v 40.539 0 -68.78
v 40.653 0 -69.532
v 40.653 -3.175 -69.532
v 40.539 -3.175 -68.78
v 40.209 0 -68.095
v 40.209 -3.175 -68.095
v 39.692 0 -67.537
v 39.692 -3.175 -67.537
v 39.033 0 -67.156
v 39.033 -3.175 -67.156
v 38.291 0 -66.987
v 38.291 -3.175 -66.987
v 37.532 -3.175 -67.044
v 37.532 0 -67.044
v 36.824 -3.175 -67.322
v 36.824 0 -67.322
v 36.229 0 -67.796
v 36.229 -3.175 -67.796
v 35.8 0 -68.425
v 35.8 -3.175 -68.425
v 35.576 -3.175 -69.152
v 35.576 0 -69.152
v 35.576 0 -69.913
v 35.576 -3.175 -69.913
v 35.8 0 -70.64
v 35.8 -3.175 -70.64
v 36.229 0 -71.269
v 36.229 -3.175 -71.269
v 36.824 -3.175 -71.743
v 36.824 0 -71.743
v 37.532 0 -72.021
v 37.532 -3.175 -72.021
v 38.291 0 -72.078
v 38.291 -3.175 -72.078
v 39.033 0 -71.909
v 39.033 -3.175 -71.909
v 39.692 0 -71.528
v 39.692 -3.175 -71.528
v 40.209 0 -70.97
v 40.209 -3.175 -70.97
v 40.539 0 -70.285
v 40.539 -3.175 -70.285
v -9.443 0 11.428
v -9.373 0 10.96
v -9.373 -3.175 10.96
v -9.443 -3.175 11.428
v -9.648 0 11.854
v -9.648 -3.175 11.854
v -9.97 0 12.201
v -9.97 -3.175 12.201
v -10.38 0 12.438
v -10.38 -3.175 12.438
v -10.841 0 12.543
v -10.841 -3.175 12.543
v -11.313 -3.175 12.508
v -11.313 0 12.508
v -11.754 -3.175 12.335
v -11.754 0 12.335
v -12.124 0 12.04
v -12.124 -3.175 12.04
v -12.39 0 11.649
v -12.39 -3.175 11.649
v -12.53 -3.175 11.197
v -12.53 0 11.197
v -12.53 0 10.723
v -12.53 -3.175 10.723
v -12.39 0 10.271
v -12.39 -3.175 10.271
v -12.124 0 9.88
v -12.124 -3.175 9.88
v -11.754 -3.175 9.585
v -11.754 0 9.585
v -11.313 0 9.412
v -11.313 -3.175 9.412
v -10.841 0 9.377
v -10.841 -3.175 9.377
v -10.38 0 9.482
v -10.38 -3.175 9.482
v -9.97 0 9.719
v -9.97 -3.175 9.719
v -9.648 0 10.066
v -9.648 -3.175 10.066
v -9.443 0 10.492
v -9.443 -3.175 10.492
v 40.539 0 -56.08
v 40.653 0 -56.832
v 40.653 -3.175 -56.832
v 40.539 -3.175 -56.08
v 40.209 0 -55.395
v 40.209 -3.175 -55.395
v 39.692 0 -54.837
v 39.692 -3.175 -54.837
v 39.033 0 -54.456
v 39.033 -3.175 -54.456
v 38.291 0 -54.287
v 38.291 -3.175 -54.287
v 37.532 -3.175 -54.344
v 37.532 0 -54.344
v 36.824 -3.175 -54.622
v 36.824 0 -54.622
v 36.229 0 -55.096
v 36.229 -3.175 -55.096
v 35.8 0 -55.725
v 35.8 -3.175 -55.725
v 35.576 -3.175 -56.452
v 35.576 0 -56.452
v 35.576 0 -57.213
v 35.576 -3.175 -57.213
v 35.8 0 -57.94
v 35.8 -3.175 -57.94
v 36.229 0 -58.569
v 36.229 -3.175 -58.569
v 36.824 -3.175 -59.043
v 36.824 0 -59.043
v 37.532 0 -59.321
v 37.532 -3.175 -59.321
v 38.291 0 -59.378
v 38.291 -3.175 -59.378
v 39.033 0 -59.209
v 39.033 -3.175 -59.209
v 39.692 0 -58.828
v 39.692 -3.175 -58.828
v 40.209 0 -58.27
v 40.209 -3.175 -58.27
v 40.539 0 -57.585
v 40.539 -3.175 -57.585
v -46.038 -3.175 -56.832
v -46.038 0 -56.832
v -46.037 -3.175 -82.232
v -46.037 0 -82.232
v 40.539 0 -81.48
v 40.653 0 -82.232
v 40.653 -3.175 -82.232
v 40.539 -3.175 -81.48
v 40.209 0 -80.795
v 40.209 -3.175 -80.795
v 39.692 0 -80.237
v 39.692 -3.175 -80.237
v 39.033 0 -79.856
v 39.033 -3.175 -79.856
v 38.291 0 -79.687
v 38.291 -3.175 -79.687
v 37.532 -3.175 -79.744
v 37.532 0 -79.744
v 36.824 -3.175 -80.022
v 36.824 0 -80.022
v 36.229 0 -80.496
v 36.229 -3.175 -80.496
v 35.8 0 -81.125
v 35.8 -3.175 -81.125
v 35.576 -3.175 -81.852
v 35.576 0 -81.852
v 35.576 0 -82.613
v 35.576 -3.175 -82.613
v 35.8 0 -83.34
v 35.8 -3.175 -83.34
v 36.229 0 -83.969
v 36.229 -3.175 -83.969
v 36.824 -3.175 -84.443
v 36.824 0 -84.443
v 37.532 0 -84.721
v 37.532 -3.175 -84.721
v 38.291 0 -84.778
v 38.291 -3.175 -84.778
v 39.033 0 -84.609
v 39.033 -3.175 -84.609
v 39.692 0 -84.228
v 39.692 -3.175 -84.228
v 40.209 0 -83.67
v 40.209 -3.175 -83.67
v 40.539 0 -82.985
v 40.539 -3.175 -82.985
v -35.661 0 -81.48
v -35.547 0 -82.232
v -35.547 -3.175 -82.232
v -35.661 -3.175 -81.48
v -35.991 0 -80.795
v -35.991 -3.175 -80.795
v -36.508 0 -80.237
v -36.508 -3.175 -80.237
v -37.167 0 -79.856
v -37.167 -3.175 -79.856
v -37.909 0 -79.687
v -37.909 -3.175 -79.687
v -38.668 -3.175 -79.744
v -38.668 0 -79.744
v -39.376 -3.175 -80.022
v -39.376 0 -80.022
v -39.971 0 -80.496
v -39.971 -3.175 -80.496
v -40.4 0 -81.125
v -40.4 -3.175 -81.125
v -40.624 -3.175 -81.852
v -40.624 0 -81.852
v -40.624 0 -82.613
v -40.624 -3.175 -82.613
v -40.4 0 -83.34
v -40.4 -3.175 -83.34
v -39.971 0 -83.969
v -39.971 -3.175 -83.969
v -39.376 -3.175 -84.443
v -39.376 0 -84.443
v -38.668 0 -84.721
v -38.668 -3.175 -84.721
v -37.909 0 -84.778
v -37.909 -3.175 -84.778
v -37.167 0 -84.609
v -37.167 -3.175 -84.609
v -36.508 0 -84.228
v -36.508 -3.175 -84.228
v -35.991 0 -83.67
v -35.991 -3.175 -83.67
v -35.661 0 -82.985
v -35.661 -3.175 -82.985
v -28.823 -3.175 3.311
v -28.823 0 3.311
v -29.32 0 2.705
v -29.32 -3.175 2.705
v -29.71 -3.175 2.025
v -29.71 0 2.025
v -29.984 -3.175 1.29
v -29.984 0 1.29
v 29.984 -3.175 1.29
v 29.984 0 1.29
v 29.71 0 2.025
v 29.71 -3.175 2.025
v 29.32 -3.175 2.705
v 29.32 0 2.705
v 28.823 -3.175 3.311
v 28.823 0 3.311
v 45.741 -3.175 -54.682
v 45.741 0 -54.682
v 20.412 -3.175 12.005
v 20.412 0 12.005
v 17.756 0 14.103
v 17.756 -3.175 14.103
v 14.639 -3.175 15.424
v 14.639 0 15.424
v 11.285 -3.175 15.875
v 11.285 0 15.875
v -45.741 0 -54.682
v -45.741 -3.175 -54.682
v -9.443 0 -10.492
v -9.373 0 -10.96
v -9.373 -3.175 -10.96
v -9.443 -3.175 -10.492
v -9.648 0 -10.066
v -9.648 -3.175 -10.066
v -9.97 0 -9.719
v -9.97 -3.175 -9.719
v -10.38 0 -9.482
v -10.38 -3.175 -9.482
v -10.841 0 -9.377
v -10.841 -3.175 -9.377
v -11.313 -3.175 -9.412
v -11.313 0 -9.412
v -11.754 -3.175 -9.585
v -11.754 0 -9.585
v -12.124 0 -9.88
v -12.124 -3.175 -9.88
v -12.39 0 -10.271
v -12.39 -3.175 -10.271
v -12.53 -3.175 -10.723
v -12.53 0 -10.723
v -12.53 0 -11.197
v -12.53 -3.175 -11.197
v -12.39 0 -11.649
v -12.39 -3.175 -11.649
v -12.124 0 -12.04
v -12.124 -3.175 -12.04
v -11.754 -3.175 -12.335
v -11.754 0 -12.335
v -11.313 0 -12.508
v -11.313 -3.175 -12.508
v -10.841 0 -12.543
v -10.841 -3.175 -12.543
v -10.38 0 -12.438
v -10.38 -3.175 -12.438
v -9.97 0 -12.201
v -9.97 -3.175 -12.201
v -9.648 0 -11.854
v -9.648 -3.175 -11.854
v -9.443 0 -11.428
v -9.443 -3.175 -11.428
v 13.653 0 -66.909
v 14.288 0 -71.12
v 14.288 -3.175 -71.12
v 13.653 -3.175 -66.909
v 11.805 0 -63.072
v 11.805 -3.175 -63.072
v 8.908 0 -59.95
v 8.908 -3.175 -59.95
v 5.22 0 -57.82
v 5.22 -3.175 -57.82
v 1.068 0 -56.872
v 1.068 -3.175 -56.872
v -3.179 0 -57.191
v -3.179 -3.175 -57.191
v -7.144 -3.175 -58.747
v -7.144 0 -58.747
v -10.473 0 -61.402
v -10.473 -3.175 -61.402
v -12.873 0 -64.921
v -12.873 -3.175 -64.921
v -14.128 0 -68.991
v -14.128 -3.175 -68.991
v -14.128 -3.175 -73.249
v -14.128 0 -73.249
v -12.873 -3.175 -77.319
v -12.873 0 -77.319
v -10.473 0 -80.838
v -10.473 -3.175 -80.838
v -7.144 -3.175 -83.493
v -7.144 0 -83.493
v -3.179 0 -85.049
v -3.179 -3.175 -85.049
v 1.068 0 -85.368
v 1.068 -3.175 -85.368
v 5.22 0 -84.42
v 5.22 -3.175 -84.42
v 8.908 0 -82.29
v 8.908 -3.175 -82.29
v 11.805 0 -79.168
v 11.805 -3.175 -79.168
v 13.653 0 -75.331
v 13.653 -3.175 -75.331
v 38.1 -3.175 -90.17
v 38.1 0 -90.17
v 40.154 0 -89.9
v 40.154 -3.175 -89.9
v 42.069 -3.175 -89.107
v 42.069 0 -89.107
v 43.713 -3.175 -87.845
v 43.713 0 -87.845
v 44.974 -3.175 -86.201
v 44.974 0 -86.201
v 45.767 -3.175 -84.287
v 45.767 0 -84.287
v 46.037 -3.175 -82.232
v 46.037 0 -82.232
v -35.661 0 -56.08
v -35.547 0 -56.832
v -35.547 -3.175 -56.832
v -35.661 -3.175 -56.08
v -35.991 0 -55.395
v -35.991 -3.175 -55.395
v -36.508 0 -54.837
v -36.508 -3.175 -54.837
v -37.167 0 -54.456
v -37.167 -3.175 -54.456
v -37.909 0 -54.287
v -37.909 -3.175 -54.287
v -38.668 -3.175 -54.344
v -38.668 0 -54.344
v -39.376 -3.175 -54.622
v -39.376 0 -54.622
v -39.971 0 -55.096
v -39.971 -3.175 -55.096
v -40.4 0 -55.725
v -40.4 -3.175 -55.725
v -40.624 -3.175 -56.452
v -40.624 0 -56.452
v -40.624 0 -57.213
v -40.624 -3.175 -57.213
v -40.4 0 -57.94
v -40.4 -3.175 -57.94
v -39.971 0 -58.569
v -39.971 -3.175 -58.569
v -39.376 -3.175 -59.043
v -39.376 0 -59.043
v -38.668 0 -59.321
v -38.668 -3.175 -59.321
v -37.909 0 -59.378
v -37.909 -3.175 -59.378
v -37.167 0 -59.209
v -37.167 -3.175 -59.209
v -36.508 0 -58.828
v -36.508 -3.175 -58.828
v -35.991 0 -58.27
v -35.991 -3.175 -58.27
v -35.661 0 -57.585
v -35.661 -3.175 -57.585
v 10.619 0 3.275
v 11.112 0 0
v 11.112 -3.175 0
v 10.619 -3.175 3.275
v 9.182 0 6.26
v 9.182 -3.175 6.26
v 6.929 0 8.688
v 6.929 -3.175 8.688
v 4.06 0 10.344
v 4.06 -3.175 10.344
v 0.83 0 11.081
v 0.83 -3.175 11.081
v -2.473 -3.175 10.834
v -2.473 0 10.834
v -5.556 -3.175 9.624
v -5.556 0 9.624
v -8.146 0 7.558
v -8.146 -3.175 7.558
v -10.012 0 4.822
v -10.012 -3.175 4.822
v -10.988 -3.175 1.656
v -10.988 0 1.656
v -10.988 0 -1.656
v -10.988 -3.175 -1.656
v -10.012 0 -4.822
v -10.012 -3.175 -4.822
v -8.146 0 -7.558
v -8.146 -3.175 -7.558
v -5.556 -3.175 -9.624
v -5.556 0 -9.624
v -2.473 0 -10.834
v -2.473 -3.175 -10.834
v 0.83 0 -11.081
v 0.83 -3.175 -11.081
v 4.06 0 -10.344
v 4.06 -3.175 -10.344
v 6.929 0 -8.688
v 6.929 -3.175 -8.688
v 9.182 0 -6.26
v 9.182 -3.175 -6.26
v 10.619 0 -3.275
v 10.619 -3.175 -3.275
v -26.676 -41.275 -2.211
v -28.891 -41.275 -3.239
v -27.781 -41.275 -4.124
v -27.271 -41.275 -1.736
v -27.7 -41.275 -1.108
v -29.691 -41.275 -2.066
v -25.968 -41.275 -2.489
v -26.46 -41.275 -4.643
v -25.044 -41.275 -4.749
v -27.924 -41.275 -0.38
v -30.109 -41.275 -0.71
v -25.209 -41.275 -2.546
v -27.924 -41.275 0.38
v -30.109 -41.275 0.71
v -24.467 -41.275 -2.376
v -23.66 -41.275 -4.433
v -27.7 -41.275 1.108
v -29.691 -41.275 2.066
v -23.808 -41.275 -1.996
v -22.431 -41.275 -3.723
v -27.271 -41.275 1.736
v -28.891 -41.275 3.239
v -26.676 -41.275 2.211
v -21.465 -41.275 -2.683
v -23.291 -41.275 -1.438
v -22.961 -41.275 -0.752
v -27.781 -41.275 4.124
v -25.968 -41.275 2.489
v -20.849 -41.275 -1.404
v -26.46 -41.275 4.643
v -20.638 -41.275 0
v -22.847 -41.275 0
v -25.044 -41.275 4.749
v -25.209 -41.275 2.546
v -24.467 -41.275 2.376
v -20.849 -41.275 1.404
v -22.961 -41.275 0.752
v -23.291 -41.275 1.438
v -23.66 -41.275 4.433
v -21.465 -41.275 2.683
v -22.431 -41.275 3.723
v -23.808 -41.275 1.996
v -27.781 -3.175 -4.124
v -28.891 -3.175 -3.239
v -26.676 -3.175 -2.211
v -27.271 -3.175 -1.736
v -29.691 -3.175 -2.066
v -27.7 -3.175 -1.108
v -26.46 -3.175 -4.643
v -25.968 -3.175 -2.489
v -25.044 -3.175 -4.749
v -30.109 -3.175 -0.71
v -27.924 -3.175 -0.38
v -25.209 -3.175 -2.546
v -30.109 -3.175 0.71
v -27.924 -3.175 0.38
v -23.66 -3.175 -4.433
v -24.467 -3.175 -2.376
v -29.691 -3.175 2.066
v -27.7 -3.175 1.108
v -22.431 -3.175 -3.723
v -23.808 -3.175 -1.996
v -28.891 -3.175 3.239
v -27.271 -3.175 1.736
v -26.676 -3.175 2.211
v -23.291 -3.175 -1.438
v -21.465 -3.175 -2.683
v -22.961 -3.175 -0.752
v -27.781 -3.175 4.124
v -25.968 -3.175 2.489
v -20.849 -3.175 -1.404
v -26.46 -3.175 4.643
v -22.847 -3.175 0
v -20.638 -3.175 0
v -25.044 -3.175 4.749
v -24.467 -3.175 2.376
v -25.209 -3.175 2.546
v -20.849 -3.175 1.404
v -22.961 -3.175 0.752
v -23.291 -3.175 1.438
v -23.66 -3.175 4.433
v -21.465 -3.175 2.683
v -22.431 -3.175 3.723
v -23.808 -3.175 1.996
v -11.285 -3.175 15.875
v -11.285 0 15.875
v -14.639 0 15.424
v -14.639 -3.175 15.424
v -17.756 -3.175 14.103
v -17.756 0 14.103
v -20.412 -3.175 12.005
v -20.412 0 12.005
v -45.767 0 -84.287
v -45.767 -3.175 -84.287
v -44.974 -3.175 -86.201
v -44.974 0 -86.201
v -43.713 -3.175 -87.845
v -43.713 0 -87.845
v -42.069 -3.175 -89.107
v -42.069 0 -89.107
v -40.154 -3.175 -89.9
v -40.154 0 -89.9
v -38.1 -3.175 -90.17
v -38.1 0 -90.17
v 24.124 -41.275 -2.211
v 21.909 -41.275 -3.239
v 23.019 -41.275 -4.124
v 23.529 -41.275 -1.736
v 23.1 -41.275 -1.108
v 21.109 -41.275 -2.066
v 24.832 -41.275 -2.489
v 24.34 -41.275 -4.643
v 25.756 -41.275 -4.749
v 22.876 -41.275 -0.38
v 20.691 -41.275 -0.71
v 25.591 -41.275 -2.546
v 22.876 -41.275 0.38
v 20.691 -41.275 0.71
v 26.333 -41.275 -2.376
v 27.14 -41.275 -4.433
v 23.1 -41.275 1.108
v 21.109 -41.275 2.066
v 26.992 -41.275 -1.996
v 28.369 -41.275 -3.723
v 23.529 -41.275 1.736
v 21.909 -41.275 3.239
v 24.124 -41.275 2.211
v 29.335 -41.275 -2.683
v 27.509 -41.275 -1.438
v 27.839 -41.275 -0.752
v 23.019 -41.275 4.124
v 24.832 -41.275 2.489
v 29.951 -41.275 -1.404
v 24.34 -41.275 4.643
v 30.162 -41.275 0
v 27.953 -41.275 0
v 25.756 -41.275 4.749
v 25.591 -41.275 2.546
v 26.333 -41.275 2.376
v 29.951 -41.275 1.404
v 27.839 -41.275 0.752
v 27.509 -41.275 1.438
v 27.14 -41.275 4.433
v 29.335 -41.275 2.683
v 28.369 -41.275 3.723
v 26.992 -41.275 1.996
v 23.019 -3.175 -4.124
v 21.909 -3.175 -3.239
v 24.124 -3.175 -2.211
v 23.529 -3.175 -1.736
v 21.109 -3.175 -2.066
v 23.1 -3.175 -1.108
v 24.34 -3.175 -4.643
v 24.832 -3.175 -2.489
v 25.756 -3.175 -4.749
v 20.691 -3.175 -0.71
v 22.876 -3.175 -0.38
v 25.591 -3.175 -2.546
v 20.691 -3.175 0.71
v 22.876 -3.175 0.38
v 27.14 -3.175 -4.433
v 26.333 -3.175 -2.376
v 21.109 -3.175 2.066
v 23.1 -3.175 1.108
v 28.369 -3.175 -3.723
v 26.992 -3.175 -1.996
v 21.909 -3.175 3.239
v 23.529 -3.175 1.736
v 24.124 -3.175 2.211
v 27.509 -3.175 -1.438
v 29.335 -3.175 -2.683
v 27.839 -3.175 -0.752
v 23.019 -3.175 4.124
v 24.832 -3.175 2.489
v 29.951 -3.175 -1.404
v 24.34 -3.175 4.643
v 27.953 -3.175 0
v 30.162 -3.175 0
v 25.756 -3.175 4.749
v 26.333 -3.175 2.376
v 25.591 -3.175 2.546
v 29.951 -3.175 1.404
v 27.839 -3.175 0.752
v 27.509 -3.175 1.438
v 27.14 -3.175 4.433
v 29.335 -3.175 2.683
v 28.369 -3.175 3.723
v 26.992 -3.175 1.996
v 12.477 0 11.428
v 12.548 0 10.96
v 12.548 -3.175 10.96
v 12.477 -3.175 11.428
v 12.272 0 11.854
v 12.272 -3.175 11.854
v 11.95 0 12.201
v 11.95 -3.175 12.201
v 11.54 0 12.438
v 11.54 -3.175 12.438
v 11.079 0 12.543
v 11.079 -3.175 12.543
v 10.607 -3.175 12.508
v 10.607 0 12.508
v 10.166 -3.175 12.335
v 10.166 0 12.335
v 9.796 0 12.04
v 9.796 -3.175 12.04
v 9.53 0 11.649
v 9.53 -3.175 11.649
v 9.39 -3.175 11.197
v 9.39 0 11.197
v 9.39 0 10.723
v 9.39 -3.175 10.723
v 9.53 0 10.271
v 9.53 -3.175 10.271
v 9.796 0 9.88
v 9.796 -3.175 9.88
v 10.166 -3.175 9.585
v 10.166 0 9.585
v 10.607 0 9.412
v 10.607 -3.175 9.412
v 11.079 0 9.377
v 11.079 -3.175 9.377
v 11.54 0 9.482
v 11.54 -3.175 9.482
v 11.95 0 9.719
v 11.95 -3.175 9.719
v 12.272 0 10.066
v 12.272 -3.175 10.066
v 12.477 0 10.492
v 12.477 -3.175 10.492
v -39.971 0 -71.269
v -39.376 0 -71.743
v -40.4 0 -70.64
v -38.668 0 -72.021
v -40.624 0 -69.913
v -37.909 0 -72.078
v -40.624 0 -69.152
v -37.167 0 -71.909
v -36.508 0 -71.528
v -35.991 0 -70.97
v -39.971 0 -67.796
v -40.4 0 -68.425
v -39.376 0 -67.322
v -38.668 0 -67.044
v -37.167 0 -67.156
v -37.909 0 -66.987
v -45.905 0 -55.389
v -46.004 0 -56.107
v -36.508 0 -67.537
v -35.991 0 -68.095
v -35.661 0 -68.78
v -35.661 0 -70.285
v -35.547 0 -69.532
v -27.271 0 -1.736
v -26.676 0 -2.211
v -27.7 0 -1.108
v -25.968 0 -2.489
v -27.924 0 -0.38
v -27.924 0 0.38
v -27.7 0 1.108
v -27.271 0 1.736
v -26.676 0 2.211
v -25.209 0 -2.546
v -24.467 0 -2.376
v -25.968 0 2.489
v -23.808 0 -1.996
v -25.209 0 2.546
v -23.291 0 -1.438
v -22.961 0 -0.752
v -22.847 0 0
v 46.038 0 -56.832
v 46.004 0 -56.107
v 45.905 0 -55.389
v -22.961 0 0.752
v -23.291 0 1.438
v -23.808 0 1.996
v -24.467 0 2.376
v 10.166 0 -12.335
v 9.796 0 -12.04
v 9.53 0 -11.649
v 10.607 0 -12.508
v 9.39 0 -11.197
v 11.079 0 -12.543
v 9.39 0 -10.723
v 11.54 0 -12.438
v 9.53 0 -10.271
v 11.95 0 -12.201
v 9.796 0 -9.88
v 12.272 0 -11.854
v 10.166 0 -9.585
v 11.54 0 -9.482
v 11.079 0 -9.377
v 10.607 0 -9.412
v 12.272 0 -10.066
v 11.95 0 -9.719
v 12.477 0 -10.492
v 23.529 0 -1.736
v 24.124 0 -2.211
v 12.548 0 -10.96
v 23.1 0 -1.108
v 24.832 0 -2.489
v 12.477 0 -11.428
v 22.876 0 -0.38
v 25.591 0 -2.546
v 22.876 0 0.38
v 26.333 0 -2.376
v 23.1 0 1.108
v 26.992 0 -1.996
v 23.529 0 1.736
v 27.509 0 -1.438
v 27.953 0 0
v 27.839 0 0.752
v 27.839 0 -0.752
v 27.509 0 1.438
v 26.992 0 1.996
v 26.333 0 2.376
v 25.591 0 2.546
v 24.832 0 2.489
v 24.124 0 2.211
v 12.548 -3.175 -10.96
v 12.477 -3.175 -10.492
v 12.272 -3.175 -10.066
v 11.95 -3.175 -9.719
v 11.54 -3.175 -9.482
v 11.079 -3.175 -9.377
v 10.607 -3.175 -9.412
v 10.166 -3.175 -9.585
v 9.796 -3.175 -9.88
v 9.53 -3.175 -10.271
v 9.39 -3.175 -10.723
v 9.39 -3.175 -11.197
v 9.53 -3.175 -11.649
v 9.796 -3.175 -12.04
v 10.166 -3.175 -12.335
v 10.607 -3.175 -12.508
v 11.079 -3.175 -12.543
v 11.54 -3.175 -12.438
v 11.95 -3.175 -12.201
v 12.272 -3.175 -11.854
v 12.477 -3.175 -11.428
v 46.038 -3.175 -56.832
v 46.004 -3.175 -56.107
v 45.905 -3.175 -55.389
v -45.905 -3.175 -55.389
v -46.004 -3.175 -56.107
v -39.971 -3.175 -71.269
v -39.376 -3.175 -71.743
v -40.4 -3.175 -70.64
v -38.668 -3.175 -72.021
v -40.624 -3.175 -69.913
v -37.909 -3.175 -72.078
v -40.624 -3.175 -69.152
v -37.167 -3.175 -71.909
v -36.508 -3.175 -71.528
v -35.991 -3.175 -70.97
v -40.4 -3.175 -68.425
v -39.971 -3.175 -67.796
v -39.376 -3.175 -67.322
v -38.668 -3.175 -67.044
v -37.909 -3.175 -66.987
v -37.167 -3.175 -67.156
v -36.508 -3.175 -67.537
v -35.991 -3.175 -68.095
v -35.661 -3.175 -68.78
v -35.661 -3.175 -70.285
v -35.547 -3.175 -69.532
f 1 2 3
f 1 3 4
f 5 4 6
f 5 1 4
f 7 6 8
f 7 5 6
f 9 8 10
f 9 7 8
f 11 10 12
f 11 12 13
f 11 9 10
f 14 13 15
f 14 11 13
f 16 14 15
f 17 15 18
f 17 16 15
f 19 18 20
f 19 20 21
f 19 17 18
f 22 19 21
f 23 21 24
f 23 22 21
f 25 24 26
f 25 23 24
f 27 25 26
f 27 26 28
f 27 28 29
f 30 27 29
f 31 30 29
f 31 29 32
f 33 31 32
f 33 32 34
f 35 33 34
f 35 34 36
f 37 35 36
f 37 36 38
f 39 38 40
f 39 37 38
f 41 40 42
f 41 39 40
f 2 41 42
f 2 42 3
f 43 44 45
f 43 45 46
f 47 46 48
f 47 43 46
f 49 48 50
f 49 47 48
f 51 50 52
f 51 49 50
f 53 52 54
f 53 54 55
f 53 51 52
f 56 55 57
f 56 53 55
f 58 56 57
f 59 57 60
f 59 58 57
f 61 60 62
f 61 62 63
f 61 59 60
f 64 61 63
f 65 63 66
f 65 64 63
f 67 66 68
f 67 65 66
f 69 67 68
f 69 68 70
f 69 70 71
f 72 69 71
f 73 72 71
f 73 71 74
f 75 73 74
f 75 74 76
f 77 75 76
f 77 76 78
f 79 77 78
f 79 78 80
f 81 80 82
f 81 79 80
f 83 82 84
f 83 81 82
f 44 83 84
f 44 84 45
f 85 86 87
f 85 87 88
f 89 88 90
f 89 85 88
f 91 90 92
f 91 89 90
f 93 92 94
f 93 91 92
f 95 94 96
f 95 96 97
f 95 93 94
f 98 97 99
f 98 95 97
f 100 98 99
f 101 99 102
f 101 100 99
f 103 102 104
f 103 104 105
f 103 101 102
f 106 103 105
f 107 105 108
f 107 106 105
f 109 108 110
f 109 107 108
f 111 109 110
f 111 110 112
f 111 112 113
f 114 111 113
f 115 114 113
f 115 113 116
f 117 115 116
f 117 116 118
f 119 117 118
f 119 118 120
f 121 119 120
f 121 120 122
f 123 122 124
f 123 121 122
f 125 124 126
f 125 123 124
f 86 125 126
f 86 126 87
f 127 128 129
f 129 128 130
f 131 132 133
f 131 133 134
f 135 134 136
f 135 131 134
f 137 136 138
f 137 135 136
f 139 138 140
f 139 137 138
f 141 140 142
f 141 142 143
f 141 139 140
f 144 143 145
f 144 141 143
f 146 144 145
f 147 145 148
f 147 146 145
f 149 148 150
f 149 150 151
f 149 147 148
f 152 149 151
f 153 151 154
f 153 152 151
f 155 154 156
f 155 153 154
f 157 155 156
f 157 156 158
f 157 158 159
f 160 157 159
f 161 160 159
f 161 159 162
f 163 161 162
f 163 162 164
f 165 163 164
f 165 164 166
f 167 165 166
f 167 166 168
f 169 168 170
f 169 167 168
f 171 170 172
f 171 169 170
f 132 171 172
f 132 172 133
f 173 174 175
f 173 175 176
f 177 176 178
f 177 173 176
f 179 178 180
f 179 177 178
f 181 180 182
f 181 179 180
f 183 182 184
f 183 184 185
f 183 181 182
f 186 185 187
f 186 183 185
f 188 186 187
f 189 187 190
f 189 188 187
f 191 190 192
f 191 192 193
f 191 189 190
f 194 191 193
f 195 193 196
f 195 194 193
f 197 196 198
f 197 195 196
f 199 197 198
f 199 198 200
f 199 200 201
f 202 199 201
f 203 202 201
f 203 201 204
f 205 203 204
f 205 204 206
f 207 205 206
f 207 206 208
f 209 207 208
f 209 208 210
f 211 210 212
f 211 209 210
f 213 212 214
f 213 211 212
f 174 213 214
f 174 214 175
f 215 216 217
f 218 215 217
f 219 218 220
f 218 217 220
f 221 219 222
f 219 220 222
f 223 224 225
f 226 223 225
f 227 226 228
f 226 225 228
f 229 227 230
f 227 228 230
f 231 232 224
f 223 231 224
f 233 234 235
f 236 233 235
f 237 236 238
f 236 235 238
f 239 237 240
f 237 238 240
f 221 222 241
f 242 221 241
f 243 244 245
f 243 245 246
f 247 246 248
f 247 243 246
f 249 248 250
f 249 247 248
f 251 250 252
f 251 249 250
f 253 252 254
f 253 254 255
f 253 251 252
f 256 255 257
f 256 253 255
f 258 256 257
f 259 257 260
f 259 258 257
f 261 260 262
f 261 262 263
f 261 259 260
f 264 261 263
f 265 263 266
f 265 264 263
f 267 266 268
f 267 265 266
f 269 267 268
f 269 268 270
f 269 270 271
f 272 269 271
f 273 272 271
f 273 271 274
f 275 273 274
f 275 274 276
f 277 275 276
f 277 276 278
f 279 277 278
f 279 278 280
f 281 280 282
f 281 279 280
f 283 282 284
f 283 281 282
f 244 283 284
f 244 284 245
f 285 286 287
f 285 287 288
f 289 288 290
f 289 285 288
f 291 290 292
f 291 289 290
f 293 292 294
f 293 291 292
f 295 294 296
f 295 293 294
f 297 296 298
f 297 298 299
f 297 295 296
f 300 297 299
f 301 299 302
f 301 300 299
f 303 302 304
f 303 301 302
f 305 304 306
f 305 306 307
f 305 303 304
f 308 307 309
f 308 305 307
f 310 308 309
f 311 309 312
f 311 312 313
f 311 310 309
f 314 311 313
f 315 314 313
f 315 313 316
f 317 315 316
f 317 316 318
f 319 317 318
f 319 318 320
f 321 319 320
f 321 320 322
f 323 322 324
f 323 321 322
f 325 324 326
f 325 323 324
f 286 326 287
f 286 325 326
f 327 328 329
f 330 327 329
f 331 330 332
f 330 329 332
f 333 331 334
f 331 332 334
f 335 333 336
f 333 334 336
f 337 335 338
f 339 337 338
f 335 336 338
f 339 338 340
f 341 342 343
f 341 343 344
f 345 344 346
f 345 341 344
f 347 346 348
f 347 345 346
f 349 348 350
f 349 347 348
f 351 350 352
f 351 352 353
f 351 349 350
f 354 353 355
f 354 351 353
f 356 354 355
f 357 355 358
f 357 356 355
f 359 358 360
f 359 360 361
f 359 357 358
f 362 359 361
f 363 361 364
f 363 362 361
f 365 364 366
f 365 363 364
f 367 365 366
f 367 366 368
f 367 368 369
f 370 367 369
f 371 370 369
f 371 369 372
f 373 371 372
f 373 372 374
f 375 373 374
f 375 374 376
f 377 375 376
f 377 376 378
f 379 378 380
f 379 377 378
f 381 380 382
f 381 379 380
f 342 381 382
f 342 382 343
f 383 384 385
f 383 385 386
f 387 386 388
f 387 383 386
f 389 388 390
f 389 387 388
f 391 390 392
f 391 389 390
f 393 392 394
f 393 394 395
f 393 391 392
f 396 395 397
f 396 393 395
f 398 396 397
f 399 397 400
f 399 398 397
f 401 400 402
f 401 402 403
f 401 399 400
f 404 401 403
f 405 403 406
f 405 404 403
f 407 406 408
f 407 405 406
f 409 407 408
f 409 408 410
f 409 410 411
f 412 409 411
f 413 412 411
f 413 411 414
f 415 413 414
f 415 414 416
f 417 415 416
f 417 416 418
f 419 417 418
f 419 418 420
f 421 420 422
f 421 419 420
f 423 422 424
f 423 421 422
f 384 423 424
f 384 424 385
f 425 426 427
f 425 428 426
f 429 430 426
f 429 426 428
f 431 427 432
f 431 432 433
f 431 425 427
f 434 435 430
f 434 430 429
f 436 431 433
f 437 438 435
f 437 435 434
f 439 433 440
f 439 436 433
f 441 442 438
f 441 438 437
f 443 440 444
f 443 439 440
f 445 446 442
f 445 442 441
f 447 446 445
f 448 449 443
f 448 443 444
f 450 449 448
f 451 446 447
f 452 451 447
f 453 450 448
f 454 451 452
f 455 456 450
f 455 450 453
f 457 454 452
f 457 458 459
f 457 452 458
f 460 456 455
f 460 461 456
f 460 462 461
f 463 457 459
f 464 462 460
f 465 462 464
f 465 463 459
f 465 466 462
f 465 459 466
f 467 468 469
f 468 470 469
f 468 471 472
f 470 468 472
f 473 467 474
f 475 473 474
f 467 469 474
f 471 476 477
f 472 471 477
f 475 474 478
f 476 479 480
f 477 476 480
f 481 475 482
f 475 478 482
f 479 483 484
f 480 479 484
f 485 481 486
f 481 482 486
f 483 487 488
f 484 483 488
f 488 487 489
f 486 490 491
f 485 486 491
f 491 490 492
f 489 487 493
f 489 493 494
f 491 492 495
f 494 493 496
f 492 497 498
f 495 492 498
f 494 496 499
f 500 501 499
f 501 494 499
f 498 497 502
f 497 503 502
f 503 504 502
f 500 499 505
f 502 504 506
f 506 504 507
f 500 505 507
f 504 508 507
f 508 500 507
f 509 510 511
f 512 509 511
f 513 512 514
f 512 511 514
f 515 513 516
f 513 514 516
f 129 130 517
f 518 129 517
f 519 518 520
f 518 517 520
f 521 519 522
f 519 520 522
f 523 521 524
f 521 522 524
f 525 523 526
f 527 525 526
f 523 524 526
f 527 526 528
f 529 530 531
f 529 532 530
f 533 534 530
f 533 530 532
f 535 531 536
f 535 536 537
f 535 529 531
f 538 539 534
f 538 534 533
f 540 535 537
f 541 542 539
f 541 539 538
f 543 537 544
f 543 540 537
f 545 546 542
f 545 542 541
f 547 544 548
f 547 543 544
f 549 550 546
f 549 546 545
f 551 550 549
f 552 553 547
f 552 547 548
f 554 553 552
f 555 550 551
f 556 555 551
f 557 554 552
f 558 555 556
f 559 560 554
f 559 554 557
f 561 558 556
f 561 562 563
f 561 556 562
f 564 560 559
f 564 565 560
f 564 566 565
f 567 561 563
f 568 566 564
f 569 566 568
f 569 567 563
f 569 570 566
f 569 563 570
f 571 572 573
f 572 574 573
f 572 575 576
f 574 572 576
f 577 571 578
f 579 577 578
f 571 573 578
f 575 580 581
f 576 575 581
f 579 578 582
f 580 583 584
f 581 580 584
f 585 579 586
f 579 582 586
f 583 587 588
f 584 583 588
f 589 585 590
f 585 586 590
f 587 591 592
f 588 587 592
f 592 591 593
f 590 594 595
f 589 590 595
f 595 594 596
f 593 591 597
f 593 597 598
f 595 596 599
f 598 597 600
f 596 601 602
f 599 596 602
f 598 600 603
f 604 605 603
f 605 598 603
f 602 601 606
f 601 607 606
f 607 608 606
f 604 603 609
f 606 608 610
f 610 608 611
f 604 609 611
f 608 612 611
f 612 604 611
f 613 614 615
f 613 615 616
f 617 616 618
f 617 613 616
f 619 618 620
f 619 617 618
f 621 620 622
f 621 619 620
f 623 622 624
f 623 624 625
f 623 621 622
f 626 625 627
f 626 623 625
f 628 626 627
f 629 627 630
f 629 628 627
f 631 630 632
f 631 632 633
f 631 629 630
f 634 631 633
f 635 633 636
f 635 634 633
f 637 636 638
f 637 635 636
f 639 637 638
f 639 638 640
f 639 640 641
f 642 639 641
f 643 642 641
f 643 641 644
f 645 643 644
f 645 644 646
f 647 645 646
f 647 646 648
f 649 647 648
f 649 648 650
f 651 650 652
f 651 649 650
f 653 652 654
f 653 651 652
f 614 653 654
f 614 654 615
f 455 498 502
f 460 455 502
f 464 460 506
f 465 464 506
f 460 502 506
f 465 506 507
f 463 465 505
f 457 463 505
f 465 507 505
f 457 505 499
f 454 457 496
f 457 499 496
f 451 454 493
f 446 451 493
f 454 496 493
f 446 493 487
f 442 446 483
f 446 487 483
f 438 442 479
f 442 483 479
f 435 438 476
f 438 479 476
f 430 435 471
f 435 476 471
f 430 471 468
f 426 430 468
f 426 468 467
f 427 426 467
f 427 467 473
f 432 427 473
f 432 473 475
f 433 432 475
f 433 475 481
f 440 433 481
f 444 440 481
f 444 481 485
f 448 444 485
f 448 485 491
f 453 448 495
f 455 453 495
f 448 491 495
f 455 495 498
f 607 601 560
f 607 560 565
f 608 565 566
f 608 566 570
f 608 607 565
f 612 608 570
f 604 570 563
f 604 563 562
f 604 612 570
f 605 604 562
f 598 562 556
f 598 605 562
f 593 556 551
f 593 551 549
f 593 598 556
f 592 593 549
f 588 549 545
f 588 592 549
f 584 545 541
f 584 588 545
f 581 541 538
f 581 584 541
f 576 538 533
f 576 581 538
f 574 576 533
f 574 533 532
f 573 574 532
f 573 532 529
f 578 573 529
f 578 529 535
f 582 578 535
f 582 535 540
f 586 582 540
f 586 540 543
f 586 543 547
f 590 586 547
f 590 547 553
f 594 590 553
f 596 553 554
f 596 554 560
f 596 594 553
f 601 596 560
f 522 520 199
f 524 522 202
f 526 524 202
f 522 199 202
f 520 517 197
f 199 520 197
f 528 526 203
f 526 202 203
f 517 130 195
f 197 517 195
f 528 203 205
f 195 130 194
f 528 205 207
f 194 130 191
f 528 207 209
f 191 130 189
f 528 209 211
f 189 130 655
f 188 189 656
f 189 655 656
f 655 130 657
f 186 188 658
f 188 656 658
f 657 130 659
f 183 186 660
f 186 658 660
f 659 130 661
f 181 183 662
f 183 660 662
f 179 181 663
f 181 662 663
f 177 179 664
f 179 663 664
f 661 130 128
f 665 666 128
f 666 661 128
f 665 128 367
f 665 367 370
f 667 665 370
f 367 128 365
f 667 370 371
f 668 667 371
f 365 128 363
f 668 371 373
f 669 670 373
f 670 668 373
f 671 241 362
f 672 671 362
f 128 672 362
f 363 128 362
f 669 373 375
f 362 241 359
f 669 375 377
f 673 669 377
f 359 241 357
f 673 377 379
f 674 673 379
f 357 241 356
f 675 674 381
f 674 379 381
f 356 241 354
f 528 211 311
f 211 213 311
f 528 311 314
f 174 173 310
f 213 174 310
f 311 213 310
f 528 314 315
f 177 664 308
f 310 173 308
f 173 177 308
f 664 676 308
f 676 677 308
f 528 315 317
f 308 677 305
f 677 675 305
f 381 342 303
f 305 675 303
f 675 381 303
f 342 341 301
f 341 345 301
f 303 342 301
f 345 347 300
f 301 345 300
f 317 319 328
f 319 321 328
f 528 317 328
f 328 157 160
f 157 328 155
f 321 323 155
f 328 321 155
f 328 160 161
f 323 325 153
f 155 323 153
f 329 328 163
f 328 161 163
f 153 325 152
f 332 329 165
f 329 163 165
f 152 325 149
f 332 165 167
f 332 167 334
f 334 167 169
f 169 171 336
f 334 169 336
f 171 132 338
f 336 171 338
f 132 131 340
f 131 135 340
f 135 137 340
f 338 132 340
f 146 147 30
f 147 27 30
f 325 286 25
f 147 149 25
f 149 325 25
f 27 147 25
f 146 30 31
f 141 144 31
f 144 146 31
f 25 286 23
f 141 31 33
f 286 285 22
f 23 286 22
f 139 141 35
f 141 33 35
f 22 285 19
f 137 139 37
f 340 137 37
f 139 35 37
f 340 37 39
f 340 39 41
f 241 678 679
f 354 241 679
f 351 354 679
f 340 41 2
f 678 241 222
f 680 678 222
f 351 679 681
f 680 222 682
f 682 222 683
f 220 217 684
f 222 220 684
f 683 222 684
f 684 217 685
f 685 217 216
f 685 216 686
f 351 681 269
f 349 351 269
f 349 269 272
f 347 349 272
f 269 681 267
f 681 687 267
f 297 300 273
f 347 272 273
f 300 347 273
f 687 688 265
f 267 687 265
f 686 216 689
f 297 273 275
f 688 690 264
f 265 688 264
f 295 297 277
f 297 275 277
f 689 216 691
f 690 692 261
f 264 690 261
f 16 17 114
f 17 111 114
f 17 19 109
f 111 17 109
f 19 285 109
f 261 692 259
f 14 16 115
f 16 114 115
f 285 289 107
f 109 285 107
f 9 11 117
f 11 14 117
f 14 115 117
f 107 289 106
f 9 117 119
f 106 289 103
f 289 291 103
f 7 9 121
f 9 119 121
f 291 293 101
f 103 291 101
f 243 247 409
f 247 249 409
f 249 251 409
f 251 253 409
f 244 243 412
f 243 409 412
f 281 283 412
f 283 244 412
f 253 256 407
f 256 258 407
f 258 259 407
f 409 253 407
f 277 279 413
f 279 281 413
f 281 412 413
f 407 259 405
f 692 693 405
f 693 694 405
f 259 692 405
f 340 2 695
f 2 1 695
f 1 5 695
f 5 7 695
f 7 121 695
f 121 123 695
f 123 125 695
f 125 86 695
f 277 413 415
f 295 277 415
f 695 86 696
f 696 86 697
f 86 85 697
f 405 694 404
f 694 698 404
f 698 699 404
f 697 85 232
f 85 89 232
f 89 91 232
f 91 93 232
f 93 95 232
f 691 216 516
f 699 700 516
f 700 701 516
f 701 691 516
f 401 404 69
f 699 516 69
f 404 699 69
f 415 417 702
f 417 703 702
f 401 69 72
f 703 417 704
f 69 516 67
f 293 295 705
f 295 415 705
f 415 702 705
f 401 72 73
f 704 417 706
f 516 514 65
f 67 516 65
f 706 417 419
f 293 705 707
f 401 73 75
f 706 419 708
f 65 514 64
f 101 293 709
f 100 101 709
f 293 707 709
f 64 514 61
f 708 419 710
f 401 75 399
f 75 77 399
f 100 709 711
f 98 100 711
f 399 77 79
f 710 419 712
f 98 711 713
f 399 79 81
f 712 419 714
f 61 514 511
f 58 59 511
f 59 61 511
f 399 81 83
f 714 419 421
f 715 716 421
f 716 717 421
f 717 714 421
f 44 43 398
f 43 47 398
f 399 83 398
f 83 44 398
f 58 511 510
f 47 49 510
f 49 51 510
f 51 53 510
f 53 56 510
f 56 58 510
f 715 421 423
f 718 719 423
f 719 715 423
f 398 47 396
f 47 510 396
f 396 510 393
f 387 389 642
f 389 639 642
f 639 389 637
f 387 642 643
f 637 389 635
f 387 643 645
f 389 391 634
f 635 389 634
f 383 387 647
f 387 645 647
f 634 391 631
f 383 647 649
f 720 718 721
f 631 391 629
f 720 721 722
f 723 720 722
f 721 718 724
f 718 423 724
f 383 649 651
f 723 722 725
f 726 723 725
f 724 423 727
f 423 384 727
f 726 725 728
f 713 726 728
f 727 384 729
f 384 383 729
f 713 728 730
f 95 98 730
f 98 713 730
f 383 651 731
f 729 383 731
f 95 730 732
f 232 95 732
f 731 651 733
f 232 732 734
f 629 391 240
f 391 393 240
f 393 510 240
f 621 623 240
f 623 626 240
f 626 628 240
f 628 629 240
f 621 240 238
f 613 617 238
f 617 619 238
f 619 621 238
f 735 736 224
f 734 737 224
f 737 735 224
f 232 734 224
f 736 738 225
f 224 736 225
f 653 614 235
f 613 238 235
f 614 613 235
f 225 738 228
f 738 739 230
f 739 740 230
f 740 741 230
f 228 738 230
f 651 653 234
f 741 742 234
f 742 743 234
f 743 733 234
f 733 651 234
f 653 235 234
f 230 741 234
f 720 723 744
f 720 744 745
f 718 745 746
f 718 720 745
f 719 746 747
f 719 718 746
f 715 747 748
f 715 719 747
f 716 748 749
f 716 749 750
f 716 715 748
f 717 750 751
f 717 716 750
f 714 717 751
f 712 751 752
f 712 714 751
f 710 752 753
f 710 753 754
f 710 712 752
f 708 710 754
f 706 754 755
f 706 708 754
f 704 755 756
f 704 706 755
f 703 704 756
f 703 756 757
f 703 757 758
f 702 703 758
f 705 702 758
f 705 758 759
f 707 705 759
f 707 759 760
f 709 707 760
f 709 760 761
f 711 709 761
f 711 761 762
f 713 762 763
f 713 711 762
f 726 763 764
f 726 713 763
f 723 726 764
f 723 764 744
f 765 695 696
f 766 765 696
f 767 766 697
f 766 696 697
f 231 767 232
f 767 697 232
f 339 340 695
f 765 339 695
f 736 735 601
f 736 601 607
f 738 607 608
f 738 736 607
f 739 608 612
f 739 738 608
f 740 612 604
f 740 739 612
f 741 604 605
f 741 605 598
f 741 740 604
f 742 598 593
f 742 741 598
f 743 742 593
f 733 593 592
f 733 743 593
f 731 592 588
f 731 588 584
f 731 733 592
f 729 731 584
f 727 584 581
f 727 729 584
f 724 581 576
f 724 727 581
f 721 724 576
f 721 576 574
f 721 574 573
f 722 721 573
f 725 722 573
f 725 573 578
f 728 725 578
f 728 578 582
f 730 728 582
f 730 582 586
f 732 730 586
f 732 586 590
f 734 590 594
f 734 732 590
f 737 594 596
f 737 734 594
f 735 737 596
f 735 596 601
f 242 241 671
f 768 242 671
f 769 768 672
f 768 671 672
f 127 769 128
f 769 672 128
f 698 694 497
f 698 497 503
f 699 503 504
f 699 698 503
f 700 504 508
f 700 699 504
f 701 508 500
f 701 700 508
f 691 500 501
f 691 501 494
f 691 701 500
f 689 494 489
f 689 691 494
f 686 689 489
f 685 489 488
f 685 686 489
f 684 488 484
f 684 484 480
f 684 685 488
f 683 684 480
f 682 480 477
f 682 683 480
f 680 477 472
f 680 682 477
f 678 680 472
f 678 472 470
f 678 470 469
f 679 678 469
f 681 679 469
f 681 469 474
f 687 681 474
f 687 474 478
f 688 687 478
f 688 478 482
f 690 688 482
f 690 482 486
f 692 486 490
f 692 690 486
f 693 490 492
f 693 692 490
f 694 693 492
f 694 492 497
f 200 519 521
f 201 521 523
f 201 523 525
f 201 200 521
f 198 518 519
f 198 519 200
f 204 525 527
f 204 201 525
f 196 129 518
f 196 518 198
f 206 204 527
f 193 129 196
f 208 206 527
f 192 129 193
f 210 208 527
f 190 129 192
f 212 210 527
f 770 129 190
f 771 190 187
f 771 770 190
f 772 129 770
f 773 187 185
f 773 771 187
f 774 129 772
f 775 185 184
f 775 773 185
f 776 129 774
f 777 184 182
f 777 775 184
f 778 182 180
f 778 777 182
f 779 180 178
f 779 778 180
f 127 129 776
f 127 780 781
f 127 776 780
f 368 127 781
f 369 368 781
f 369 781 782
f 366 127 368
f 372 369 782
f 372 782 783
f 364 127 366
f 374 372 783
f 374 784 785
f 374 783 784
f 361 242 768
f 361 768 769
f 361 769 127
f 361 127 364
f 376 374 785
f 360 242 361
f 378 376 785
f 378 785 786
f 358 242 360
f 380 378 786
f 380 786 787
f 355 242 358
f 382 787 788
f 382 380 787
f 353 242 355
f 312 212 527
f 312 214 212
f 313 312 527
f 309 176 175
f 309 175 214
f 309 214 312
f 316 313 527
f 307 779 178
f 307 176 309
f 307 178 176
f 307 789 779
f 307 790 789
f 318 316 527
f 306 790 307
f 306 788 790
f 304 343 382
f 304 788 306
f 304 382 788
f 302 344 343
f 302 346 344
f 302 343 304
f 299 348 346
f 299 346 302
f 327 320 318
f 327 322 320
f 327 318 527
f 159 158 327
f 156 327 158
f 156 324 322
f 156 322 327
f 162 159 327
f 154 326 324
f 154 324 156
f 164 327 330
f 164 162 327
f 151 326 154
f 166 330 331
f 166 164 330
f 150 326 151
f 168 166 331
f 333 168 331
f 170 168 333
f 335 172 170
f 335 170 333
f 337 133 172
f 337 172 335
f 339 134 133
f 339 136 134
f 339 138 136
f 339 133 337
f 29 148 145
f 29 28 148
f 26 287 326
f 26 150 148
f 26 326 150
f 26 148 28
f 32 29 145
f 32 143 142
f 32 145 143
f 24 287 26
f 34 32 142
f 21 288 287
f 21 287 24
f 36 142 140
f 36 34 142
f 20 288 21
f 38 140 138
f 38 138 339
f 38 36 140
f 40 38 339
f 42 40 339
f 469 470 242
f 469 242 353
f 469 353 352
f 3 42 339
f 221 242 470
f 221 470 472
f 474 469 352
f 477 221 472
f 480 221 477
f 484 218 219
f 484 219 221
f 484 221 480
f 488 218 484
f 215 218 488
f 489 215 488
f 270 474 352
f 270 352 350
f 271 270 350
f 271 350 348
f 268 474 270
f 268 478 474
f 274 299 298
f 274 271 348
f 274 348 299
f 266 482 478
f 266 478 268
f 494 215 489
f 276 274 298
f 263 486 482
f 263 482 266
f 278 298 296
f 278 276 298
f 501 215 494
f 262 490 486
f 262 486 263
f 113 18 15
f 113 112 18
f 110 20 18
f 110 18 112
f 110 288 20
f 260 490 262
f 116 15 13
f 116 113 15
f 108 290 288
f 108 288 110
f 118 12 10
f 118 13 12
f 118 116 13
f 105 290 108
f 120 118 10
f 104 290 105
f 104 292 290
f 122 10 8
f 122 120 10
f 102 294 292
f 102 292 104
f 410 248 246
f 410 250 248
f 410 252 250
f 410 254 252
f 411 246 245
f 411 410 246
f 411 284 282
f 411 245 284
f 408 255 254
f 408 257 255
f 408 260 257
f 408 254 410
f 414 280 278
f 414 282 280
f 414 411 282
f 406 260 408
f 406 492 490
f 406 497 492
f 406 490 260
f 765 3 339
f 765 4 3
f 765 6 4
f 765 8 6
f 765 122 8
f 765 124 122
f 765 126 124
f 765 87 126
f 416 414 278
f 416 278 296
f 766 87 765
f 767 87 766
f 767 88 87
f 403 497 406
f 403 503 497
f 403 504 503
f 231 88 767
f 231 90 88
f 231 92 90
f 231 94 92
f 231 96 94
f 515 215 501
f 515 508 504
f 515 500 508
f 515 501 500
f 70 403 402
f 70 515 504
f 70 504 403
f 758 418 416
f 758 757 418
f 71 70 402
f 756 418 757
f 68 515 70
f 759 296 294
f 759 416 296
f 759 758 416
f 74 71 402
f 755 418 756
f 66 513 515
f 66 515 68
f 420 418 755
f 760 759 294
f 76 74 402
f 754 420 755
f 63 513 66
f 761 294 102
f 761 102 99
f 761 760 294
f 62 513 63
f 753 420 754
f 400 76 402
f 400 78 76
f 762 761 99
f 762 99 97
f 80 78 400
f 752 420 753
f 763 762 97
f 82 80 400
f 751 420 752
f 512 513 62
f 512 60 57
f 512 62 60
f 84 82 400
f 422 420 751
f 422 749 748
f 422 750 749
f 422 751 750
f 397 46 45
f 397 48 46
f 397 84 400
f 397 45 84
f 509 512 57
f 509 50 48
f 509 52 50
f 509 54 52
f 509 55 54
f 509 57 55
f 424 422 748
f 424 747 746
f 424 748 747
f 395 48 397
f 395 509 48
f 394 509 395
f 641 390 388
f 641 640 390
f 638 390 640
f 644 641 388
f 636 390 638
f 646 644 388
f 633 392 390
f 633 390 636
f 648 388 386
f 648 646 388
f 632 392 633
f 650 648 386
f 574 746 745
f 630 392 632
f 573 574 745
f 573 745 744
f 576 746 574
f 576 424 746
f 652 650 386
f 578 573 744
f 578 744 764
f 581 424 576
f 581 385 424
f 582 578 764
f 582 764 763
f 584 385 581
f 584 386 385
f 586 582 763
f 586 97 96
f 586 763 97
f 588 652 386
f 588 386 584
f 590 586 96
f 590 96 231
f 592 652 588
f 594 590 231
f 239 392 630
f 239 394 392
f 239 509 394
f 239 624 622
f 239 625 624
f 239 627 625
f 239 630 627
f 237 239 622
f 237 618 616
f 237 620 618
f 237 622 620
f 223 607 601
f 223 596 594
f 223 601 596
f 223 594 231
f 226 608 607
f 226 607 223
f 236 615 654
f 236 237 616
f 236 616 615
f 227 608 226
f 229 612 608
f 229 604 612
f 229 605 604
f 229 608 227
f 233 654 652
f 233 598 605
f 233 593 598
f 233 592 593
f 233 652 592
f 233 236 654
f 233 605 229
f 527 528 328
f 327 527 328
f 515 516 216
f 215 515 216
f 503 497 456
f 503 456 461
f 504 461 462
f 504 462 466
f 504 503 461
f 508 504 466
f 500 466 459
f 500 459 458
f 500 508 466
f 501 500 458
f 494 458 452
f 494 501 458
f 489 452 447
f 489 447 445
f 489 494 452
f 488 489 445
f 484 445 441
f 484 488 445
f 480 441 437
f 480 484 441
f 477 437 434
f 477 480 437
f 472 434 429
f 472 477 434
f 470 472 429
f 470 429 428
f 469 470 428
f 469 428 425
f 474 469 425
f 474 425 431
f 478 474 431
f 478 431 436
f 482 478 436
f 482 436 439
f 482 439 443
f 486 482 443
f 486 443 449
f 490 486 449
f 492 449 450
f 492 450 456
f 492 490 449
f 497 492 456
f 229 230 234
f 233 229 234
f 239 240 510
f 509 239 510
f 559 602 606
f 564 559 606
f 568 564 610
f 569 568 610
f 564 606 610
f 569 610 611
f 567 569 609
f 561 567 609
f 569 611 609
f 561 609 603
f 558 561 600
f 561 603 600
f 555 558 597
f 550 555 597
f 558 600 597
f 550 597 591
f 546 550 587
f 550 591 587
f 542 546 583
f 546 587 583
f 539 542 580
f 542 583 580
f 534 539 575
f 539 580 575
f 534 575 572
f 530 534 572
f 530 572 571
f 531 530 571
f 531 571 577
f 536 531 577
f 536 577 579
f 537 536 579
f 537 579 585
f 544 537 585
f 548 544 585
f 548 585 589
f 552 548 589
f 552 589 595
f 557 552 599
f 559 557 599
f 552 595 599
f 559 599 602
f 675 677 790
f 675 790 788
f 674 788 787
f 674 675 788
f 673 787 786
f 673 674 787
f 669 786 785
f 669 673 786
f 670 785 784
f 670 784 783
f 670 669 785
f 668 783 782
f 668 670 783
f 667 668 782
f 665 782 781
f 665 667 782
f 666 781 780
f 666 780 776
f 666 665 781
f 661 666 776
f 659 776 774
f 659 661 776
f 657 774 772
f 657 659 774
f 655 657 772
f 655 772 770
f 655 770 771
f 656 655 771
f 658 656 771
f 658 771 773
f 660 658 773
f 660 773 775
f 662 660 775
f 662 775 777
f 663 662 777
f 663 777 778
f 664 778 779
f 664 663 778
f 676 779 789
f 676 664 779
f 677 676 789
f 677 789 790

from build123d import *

# Parameters (mm, degrees)
F0_R     = 2.5527
F0_R_2   = 14.2875
F0_R_3   = 1.5875
F0_R_4   = 11.1125
F1_DEPTH = 3.175
F2_R     = 4.7625
F2_R_2   = 2.5527
F3_DEPTH = 38.1


with BuildPart() as f1:
    # F0 (on Front) → F1 (new body)
    with BuildSketch(Plane.XZ):
        with BuildLine():
            Line((-20.41235, 12.005275), (-28.822915, 3.311353))
            ThreePointArc((-28.822915, 3.311353), (-29.529158, 2.37307), (-29.984325, 1.290492))
            Line((-29.984325, 1.290492), (-45.740542, -54.681681))
            ThreePointArc((-45.740542, -54.681681), (-45.96291, -55.746889), (-46.0375, -56.8325))
            Line((-46.0375, -56.8325), (-46.0375, -82.2325))
            ThreePointArc((-46.0375, -82.2325), (-43.71266, -87.84516), (-38.1, -90.17))
            Line((-38.1, -90.17), (38.1, -90.17))
            ThreePointArc((38.1, -90.17), (43.71266, -87.84516), (46.0375, -82.2325))
            Line((46.0375, -82.2325), (46.0375, -56.8325))
            ThreePointArc((46.0375, -56.8325), (45.96291, -55.746889), (45.740542, -54.681681))
            Line((45.740542, -54.681681), (29.984325, 1.290492))
            ThreePointArc((29.984325, 1.290492), (29.529158, 2.37307), (28.822915, 3.311353))
            Line((28.822915, 3.311353), (20.41235, 12.005275))
            ThreePointArc((20.41235, 12.005275), (16.241669, 14.867615), (11.284577, 15.875))
            Line((11.284577, 15.875), (-11.284577, 15.875))
            ThreePointArc((-11.284577, 15.875), (-16.241669, 14.867615), (-20.41235, 12.005275))
        make_face()
        with Locations((-38.1, -82.2325)):
            Circle(F0_R, mode=Mode.SUBTRACT)
        with Locations((-38.1, -69.5325)):
            Circle(F0_R, mode=Mode.SUBTRACT)
        with Locations((-38.1, -56.8325)):
            Circle(F0_R, mode=Mode.SUBTRACT)
        with Locations((0, -71.12)):
            Circle(F0_R_2, mode=Mode.SUBTRACT)
        with Locations((38.1, -82.2325)):
            Circle(F0_R, mode=Mode.SUBTRACT)
        with Locations((38.1, -69.5325)):
            Circle(F0_R, mode=Mode.SUBTRACT)
        with Locations((38.1, -56.8325)):
            Circle(F0_R, mode=Mode.SUBTRACT)
        with Locations((-10.9601, -10.9601)):
            Circle(F0_R_3, mode=Mode.SUBTRACT)
        with Locations((-25.4, 0)):
            Circle(F0_R, mode=Mode.SUBTRACT)
        with Locations((-10.9601, 10.9601)):
            Circle(F0_R_3, mode=Mode.SUBTRACT)
        with Locations((10.9601, -10.9601)):
            Circle(F0_R_3, mode=Mode.SUBTRACT)
        Circle(F0_R_4, mode=Mode.SUBTRACT)
        with Locations((10.9601, 10.9601)):
            Circle(F0_R_3, mode=Mode.SUBTRACT)
        with Locations((25.4, 0)):
            Circle(F0_R, mode=Mode.SUBTRACT)
    extrude(amount=F1_DEPTH)


with BuildPart() as f3:
    # F2 (on face) → F3 (new body)
    with BuildSketch(Plane.XZ.offset(3.175)):
        with Locations((-25.4, 0)):
            Circle(F2_R)
        with Locations((-25.4, 0)):
            Circle(F2_R_2, mode=Mode.SUBTRACT)
        with Locations((25.4, 0)):
            Circle(F2_R)
        with Locations((25.4, 0)):
            Circle(F2_R_2, mode=Mode.SUBTRACT)
    extrude(amount=F3_DEPTH)


solid = Compound([f1.part, f3.part])
